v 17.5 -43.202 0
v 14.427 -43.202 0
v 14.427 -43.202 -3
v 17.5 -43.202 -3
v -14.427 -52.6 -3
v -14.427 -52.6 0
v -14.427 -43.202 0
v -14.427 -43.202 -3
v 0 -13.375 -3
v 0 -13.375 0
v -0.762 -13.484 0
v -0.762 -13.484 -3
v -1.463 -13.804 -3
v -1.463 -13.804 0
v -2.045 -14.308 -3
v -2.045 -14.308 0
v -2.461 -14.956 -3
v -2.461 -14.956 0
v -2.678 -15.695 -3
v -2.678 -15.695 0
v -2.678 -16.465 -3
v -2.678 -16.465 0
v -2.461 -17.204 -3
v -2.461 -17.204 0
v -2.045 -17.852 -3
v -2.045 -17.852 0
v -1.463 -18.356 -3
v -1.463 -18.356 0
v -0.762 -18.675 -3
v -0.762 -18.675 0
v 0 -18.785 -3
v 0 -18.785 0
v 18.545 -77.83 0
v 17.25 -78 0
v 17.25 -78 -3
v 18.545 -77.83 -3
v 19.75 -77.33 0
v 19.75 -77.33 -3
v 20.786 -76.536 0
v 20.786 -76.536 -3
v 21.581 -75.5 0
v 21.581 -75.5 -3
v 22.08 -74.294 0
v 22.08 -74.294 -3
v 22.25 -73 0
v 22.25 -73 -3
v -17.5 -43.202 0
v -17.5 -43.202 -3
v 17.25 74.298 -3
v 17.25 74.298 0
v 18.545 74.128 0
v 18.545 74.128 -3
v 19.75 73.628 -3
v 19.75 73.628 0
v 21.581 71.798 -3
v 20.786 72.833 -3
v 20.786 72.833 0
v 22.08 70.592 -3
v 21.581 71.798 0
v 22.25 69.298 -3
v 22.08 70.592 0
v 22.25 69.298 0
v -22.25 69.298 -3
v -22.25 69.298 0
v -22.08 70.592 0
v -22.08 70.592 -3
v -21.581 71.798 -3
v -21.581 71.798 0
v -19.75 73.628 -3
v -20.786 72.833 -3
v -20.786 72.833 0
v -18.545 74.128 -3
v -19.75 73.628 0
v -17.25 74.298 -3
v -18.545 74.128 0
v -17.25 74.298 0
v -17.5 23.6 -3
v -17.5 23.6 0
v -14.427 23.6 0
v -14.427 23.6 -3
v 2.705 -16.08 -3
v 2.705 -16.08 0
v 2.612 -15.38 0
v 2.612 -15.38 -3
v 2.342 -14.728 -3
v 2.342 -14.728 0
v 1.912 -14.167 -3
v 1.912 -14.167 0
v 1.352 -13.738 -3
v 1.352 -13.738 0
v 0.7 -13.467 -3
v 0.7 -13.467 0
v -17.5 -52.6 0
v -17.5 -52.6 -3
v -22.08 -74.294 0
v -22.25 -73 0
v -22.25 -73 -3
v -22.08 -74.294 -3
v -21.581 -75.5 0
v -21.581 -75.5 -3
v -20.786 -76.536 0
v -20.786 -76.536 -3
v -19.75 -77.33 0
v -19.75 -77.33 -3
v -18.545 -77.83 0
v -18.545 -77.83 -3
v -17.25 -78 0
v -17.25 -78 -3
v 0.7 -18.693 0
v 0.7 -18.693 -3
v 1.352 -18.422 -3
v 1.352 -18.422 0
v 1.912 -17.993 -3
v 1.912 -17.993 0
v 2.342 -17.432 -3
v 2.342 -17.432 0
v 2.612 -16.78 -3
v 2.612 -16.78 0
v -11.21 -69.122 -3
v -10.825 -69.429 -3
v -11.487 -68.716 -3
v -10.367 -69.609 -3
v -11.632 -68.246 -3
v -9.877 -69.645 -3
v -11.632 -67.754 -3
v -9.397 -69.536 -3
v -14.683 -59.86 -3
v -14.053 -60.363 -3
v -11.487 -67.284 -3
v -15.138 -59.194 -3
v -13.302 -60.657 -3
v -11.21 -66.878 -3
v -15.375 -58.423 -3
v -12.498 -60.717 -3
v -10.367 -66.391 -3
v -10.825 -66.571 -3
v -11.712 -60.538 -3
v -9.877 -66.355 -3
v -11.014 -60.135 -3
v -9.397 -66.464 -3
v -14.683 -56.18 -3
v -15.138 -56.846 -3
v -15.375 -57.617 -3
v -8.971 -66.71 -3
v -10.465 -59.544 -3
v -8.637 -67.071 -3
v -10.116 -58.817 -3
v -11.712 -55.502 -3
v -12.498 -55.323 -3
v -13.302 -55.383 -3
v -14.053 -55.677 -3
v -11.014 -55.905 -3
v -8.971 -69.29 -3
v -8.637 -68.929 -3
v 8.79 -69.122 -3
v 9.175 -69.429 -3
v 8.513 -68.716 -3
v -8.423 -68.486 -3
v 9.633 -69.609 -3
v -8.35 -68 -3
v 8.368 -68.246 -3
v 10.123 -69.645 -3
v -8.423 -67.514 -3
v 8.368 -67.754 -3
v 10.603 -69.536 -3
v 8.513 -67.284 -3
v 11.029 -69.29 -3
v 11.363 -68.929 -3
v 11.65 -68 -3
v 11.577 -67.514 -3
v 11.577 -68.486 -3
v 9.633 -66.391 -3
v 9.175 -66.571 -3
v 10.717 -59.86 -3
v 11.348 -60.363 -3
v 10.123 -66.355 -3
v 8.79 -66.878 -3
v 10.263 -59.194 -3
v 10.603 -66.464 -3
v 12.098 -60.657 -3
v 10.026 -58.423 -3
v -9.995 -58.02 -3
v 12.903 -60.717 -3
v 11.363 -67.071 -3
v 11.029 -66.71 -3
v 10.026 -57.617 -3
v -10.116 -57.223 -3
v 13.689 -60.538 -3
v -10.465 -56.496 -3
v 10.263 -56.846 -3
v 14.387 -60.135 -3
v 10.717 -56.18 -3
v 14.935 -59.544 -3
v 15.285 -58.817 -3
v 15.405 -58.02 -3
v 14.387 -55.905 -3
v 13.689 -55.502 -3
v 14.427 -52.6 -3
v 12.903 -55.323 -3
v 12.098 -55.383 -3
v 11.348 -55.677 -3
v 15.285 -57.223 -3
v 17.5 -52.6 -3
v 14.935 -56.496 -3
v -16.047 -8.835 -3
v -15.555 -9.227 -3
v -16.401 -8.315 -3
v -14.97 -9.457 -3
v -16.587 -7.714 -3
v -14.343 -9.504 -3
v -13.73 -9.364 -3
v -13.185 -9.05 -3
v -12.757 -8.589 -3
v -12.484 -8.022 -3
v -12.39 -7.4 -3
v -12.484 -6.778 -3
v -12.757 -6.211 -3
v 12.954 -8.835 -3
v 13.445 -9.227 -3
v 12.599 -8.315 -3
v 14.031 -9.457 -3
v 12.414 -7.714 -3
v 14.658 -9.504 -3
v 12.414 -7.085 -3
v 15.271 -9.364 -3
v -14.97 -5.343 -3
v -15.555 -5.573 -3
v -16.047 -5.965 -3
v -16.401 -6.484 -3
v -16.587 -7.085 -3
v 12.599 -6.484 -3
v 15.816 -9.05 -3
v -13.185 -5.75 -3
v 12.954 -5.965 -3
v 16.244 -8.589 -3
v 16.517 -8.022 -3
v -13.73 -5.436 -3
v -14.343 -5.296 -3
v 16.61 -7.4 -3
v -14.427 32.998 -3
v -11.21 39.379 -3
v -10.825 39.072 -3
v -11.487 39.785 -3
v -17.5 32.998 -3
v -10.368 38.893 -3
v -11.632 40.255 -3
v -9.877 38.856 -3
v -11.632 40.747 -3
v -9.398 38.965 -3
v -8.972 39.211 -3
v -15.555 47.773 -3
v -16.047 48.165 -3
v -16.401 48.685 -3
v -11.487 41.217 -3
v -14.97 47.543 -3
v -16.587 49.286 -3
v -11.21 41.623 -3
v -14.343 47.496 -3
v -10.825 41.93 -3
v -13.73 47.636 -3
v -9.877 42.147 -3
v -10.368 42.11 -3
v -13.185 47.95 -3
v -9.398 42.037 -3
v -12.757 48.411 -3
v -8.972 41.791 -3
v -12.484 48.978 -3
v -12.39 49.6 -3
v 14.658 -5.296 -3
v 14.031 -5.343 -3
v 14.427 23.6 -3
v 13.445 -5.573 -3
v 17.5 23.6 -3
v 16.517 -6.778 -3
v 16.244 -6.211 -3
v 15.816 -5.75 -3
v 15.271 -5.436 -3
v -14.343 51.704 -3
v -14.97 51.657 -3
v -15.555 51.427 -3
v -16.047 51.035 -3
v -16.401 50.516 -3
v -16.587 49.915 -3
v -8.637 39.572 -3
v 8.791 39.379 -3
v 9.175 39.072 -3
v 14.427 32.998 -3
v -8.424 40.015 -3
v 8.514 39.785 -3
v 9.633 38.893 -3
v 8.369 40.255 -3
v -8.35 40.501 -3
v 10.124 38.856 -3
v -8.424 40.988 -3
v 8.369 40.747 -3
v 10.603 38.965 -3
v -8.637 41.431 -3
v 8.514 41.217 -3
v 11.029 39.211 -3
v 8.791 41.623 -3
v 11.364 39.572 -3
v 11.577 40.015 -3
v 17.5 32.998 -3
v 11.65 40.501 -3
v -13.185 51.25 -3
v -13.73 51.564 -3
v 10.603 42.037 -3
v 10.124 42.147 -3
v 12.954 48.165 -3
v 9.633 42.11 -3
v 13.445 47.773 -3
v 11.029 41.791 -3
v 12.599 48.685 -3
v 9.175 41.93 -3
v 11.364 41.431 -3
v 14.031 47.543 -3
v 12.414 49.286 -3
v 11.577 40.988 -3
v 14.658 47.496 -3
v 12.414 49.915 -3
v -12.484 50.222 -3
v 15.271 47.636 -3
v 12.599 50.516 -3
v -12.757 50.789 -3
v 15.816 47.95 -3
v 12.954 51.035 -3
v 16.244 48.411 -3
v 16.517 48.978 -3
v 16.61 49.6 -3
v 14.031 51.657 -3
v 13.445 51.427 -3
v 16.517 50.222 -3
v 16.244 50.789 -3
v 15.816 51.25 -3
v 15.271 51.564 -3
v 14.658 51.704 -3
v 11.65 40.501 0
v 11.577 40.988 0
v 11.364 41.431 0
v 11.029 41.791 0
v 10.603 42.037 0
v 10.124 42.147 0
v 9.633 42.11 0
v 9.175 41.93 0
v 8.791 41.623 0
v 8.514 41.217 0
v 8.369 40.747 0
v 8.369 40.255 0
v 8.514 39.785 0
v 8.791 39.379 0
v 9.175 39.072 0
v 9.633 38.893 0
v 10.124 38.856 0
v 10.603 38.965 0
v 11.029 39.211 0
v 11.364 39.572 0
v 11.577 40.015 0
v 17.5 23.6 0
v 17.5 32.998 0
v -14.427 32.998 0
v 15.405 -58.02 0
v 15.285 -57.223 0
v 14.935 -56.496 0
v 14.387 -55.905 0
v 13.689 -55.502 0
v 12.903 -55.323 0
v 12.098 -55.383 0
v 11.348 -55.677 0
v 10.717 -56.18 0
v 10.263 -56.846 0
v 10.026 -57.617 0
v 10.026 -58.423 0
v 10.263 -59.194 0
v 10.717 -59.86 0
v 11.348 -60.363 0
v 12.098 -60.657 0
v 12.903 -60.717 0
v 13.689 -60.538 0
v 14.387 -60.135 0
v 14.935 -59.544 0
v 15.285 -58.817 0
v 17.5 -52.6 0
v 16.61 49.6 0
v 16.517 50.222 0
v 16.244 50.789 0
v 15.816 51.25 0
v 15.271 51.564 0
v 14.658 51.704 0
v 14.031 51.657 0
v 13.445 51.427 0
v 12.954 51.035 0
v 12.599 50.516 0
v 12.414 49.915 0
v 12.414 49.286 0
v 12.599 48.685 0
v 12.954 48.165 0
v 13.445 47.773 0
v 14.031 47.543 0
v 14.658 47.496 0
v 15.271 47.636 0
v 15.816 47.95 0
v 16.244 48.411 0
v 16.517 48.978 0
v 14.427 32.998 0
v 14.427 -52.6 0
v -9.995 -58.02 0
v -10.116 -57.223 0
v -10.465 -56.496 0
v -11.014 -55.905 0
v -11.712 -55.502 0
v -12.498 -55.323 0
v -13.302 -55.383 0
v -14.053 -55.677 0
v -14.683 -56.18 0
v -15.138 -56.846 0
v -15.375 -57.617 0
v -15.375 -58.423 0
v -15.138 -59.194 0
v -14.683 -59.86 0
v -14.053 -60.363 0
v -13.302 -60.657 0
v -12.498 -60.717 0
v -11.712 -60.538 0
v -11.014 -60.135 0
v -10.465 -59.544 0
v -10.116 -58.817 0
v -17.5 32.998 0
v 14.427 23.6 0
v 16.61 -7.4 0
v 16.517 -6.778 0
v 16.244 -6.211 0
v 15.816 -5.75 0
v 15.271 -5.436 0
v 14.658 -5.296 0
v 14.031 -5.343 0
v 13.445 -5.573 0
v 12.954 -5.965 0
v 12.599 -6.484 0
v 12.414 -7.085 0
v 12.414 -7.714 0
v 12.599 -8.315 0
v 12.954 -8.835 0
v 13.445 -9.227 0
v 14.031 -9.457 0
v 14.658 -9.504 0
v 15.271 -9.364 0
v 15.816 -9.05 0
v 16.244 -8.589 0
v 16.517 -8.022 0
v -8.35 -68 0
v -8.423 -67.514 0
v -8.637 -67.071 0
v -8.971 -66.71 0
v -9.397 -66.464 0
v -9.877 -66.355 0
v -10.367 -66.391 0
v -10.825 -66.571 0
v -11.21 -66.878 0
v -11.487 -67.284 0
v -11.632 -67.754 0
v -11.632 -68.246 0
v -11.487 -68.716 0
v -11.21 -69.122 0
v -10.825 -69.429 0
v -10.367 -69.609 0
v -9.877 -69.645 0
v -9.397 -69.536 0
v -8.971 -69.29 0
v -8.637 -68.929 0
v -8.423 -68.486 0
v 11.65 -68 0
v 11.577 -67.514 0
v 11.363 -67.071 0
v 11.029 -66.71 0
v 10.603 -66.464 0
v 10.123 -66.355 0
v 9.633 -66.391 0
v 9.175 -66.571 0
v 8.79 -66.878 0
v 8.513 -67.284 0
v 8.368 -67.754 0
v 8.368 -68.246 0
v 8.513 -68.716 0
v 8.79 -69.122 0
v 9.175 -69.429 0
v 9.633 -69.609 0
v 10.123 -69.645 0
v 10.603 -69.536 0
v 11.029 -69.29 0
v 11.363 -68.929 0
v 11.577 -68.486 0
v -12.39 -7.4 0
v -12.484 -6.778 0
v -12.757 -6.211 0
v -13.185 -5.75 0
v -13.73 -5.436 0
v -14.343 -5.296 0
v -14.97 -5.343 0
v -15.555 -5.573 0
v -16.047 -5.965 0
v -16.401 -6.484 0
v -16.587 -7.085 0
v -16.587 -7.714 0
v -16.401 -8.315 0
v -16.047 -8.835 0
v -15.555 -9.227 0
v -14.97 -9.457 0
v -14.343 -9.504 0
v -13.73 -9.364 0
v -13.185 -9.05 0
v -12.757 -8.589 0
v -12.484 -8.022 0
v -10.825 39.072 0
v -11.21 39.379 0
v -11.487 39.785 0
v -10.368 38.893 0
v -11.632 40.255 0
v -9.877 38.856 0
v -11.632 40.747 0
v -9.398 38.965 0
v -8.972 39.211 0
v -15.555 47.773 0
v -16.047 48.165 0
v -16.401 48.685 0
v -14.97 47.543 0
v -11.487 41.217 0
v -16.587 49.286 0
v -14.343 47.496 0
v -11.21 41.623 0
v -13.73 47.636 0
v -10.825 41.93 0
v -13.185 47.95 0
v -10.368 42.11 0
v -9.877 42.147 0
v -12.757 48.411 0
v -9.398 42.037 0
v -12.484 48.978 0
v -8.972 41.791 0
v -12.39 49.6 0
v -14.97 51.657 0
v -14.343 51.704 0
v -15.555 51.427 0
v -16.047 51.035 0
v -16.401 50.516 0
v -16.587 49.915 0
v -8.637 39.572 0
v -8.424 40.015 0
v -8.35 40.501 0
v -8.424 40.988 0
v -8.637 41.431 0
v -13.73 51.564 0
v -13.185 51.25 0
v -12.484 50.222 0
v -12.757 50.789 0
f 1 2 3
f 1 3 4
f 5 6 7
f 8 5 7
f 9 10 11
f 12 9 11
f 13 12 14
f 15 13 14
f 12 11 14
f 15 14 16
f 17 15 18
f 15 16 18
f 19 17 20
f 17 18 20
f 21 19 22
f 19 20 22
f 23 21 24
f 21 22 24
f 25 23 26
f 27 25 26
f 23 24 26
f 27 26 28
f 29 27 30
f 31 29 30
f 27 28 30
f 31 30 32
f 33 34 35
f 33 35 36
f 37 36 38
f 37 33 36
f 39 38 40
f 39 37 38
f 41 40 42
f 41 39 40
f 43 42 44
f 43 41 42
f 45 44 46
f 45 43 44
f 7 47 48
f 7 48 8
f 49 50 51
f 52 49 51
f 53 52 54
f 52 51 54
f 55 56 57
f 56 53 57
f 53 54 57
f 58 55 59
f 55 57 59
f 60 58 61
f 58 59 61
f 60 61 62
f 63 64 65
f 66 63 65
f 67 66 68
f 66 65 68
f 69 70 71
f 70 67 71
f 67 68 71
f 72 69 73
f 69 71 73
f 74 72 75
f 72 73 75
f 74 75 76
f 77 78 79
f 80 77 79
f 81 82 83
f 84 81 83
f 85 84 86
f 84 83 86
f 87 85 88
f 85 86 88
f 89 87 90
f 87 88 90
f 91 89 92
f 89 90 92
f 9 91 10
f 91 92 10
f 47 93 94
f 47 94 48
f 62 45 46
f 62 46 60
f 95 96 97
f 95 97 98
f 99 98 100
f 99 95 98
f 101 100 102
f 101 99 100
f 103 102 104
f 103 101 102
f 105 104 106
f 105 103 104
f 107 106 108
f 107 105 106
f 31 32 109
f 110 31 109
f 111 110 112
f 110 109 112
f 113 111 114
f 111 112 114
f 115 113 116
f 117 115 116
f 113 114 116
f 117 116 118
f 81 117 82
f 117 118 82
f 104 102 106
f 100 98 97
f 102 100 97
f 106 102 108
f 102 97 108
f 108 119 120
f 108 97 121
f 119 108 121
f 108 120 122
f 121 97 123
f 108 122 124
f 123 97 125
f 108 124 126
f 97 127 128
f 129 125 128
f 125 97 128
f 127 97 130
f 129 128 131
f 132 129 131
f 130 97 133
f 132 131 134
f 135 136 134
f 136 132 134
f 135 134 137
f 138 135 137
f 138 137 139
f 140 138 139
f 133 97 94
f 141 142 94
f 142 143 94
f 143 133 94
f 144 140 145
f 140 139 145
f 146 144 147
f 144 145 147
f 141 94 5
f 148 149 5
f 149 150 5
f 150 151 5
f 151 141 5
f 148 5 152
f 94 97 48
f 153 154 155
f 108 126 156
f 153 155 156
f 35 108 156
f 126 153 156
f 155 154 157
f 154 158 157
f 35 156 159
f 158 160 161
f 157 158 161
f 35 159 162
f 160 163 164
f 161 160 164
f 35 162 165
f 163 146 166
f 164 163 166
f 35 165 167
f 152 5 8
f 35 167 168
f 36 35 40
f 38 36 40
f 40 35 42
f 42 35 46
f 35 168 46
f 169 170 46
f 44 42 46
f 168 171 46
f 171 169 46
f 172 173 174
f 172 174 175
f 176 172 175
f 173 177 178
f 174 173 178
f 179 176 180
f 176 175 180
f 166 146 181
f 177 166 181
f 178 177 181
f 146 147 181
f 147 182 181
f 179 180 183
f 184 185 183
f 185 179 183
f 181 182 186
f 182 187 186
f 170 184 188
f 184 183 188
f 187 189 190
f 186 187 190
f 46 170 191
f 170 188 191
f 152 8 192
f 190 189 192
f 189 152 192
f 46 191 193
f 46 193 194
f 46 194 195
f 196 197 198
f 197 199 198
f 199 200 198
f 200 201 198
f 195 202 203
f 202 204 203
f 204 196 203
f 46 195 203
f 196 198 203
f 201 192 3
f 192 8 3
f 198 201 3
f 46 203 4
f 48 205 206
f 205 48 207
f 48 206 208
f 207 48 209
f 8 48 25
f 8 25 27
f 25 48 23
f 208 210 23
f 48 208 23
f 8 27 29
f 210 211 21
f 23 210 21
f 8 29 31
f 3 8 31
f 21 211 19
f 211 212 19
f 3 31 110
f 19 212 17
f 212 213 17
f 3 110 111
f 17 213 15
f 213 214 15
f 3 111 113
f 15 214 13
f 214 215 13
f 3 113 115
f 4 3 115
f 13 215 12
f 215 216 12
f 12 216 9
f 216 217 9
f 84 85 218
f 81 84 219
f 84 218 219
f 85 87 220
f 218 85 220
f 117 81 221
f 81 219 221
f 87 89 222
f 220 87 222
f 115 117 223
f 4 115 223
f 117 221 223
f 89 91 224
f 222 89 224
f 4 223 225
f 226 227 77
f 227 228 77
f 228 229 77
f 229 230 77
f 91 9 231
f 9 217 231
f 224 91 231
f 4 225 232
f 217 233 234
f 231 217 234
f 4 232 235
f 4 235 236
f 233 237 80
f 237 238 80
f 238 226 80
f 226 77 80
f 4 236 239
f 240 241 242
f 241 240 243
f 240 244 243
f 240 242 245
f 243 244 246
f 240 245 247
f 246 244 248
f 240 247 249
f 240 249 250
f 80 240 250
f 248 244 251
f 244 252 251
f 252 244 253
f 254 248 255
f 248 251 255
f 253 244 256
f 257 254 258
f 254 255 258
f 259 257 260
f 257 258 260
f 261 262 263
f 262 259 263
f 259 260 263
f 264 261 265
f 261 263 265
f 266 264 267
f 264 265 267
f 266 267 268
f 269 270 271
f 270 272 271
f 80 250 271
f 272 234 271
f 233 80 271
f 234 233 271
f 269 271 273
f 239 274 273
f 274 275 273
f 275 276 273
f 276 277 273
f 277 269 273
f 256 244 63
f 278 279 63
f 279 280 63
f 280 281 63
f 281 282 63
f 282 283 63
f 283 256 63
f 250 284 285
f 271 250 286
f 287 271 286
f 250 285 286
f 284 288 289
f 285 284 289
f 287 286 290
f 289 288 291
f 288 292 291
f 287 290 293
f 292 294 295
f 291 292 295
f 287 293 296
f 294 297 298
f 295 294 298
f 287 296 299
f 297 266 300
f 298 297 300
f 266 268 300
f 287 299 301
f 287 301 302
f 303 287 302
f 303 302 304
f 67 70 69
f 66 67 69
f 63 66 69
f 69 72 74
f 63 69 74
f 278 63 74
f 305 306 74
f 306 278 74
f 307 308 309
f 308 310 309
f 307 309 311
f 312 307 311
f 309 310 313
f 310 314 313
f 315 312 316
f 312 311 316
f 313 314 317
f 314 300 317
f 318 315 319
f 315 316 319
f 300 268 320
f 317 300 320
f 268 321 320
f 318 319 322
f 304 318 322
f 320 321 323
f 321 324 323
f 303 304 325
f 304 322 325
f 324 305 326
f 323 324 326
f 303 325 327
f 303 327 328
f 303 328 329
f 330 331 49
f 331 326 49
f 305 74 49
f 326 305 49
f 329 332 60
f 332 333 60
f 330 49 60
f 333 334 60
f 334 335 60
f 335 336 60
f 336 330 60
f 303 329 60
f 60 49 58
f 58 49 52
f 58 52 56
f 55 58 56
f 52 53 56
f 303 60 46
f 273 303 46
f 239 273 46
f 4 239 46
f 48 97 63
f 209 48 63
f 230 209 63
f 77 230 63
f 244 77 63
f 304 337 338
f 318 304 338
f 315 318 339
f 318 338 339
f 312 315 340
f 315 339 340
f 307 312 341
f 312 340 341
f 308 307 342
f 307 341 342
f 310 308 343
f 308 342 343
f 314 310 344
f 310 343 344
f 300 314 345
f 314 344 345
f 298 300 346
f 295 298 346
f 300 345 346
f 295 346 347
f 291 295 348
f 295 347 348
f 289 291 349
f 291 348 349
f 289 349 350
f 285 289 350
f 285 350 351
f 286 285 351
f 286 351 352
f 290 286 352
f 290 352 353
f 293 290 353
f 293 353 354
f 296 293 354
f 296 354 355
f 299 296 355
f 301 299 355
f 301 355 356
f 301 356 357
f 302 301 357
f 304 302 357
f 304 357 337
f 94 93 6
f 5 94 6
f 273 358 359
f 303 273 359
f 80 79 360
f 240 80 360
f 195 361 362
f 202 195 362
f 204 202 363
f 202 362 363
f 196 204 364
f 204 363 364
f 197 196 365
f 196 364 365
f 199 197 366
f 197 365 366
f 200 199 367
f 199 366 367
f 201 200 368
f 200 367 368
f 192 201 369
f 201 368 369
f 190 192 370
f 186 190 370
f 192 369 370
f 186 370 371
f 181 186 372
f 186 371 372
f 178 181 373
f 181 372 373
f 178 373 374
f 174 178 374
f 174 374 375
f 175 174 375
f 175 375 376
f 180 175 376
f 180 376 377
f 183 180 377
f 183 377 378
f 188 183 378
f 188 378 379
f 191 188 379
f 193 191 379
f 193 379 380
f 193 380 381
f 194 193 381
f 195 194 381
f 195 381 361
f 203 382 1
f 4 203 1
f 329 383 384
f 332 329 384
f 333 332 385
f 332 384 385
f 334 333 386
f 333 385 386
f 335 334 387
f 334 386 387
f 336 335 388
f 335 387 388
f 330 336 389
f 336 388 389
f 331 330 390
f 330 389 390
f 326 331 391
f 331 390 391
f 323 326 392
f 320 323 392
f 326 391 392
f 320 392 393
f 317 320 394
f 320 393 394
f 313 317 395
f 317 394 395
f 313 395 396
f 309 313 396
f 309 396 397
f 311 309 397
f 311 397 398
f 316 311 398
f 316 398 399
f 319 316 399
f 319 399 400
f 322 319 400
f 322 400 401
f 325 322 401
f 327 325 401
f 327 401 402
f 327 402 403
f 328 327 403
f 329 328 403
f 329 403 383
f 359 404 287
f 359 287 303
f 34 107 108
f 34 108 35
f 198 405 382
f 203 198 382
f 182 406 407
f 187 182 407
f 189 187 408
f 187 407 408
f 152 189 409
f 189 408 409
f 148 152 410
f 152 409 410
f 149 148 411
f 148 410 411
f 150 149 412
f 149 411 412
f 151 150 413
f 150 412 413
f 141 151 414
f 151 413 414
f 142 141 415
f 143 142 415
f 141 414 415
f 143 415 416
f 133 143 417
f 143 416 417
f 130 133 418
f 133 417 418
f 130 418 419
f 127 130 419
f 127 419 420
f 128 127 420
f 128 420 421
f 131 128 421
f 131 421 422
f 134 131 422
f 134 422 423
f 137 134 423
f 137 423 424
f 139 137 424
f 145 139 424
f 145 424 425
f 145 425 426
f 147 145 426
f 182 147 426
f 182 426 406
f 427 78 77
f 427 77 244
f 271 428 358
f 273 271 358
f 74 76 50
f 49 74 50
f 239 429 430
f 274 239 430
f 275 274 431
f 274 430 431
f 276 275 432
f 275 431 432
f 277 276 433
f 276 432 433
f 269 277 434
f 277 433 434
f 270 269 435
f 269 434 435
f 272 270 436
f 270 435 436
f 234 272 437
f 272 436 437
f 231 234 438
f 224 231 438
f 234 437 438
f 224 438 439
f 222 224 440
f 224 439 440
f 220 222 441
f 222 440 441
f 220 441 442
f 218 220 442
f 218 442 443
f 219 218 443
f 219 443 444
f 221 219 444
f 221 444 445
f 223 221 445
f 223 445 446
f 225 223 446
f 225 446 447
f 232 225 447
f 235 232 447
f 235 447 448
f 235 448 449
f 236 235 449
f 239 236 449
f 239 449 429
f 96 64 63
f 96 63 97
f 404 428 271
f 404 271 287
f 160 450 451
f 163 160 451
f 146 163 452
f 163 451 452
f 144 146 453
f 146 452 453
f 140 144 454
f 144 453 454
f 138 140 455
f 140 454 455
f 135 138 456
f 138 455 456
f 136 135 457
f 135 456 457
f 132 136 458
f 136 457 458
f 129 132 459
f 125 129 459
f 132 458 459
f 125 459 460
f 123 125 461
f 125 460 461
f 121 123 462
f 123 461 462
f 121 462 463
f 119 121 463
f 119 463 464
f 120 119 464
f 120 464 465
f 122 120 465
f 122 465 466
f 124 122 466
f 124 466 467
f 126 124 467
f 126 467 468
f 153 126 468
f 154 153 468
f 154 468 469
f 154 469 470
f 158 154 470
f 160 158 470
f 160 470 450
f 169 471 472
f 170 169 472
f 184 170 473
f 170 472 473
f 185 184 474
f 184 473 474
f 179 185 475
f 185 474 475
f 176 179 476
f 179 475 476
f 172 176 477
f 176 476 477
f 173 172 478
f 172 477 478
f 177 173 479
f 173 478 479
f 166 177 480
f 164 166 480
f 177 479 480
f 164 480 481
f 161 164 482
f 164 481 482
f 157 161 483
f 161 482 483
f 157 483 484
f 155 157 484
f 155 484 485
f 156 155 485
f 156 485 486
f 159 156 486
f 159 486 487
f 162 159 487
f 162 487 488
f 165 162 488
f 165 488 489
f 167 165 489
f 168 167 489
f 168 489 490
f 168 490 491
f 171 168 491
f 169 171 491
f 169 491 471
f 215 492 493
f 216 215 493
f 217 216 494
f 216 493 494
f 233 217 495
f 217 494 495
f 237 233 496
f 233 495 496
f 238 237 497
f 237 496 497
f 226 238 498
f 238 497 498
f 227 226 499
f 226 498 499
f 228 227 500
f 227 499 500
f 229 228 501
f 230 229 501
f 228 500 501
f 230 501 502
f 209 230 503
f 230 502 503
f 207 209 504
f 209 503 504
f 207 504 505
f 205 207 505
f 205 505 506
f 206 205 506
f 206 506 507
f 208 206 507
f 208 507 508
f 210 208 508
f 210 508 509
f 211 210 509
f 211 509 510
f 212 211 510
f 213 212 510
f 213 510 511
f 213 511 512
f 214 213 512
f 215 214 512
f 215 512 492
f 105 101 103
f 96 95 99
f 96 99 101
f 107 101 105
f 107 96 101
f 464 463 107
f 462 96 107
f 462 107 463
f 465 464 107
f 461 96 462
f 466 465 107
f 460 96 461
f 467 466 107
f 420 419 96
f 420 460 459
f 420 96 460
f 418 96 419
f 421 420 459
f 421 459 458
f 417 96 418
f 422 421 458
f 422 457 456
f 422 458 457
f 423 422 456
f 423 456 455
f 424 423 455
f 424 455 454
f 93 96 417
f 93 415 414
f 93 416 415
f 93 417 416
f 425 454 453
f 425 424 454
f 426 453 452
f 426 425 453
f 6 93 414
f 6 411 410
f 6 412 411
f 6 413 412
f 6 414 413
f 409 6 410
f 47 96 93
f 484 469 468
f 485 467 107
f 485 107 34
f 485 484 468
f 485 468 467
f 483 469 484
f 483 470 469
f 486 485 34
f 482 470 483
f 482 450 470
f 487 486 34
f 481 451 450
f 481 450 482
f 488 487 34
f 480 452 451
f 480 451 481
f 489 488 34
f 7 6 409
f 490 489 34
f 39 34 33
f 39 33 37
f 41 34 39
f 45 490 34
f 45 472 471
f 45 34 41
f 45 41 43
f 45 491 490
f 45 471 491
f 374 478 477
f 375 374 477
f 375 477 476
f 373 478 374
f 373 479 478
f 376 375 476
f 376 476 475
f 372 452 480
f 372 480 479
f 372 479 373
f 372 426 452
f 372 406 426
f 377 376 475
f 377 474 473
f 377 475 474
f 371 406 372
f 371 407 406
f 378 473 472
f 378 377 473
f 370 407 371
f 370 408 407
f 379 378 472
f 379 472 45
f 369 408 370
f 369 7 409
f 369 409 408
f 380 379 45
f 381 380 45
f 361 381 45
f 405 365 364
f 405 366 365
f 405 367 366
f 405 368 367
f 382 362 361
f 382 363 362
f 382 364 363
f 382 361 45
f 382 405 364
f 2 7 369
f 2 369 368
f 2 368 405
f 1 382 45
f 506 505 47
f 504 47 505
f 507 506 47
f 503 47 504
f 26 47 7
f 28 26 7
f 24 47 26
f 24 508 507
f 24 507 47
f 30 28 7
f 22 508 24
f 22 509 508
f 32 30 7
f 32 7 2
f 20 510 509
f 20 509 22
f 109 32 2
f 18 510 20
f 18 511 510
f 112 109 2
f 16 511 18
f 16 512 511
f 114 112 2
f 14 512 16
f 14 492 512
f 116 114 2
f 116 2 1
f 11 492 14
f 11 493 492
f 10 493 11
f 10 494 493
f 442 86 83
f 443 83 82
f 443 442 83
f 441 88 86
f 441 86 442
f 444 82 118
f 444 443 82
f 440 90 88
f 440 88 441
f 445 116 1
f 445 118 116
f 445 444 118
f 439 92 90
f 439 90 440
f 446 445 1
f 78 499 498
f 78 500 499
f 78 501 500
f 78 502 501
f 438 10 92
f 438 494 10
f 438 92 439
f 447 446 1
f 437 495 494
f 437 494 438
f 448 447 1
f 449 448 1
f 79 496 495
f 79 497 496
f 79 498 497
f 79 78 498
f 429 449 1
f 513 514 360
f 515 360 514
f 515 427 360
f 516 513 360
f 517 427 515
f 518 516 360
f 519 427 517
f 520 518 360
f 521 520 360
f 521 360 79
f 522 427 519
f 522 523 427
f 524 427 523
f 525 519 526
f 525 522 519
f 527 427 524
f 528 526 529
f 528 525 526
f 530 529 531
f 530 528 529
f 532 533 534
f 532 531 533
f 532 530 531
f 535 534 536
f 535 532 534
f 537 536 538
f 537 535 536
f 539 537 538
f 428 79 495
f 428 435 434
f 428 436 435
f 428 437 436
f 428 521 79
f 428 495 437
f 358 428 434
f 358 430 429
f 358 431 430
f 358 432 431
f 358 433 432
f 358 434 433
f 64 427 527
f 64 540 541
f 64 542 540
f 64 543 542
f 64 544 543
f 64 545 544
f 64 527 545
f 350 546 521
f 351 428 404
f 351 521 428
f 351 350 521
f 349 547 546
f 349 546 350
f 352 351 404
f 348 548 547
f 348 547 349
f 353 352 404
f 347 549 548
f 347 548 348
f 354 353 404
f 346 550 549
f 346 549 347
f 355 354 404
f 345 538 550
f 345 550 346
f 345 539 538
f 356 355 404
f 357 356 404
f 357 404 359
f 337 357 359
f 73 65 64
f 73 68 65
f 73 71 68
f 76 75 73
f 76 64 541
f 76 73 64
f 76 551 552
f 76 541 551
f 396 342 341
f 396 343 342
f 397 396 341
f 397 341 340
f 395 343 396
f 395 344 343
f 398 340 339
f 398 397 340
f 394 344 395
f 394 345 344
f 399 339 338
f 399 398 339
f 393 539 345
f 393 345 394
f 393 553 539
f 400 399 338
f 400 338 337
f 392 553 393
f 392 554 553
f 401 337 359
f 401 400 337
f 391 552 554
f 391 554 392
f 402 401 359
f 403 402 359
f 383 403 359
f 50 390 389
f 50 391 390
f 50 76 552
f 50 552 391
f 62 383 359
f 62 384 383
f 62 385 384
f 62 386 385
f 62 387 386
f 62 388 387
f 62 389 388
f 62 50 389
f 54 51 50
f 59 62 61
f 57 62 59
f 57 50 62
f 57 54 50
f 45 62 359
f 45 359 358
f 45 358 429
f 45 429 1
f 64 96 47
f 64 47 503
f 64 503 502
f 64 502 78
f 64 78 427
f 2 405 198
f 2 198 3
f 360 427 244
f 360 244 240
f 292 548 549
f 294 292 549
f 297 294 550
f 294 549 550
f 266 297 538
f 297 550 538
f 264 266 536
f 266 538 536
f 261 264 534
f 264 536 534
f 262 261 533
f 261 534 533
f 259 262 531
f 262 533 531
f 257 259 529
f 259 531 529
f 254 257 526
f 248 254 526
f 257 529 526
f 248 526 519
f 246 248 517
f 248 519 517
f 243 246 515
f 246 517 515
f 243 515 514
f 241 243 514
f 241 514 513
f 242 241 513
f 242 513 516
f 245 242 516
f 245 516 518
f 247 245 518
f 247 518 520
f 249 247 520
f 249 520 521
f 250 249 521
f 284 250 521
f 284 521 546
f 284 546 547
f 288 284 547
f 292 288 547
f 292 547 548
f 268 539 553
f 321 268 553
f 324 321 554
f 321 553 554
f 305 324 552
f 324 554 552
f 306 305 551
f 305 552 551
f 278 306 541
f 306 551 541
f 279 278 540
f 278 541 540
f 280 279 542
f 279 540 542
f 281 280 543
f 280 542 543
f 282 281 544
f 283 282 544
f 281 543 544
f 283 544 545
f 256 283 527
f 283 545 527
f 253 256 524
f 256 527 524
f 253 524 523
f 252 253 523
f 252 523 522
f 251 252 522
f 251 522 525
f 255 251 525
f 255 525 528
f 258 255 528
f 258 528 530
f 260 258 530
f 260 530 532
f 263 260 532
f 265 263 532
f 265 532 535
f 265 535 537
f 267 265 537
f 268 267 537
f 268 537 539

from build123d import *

# Parameters (mm, degrees)
F1_DEPTH = 2.999994
F2_R     = 1.65
F2_R_2   = 2.705
F2_R_3   = 2.11
F2_W     = 3.0734
F2_H     = 9.398
F3_DEPTH = 3.000994
F5_DEPTH = 3.000994


with BuildPart() as f1:
    # F0 (on Top) → F1 (new body)
    with BuildSketch(Plane.XY):
        with BuildLine():
            Line((-17.25041, -77.999971), (17.25041, -77.999971))
            ThreePointArc((17.25041, -77.999971), (20.785937, -76.535508), (22.2504, -72.999981))
            Line((22.2504, -72.999981), (22.2504, 72.999981))
            ThreePointArc((22.2504, 72.999981), (20.785937, 76.535508), (17.25041, 77.999971))
            Line((17.25041, 77.999971), (-17.25041, 77.999971))
            ThreePointArc((-17.25041, 77.999971), (-20.785937, 76.535508), (-22.2504, 72.999981))
            Line((-22.2504, 72.999981), (-22.2504, -72.999981))
            ThreePointArc((-22.2504, -72.999981), (-20.785937, -76.535508), (-17.25041, -77.999971))
        make_face()
    extrude(amount=-F1_DEPTH)

    # F2 (on face) → F3 (cut, through all)
    with BuildSketch(Plane.XY):
        with Locations((-9.99998, -67.999991)):
            Circle(F2_R)
        with Locations((-12.7004, -58.019971)):
            Circle(F2_R_2)
        with Locations((-14.5004, -7.399971)):
            Circle(F2_R_3)
        with Locations((-10.0004, 40.501189)):
            Circle(F2_R)
        with Locations((-14.5004, 49.600029)):
            Circle(F2_R_3)
        with BuildLine():
            ThreePointArc((0, -13.374971), (-2.7054, -16.079971), (0, -18.784971))
            Line((0, -18.784971), (0, -13.374971))
        make_face()
        with BuildLine():
            Line((0, -13.374971), (0, -18.784971))
            ThreePointArc((0, -18.784971), (1.912465, -17.992553), (2.7046, -16.079971))
            ThreePointArc((2.7046, -16.079971), (1.912465, -14.167389), (0, -13.374971))
        make_face()
        with Locations((9.99998, -67.999991)):
            Circle(F2_R)
        with Locations((12.7004, -58.019971)):
            Circle(F2_R_2)
        with Locations((14.5004, -7.399971)):
            Circle(F2_R_3)
        with Locations((10.0004, 40.501189)):
            Circle(F2_R)
        with Locations((14.5004, 49.600029)):
            Circle(F2_R_3)
        with Locations((-15.9637, -47.900971)):
            Rectangle(F2_W, F2_H)
        with Locations((-15.9637, 28.299029)):
            Rectangle(F2_W, F2_H)
        with Locations((15.9637, 28.299029)):
            Rectangle(F2_W, F2_H)
        with Locations((15.9637, -47.900971)):
            Rectangle(F2_W, F2_H)
    extrude(amount=-F3_DEPTH, mode=Mode.SUBTRACT)

    # F4 (on face) → F5 (cut, through all)
    with BuildSketch(Plane.XY):
        with BuildLine():
            ThreePointArc((-22.2504, 69.297931), (-20.785937, 72.833458), (-17.25041, 74.297921))
            Line((-17.25041, 74.297921), (17.25041, 74.297921))
            ThreePointArc((17.25041, 74.297921), (20.785937, 72.833458), (22.2504, 69.297931))
            Line((22.2504, 69.297931), (22.2504, 72.999981))
            ThreePointArc((22.2504, 72.999981), (20.785937, 76.535508), (17.25041, 77.999971))
            Line((17.25041, 77.999971), (-17.25041, 77.999971))
            ThreePointArc((-17.25041, 77.999971), (-20.785937, 76.535508), (-22.2504, 72.999981))
            Line((-22.2504, 72.999981), (-22.2504, 69.297931))
        make_face()
    extrude(amount=-F5_DEPTH, mode=Mode.SUBTRACT)


solid = f1.part
